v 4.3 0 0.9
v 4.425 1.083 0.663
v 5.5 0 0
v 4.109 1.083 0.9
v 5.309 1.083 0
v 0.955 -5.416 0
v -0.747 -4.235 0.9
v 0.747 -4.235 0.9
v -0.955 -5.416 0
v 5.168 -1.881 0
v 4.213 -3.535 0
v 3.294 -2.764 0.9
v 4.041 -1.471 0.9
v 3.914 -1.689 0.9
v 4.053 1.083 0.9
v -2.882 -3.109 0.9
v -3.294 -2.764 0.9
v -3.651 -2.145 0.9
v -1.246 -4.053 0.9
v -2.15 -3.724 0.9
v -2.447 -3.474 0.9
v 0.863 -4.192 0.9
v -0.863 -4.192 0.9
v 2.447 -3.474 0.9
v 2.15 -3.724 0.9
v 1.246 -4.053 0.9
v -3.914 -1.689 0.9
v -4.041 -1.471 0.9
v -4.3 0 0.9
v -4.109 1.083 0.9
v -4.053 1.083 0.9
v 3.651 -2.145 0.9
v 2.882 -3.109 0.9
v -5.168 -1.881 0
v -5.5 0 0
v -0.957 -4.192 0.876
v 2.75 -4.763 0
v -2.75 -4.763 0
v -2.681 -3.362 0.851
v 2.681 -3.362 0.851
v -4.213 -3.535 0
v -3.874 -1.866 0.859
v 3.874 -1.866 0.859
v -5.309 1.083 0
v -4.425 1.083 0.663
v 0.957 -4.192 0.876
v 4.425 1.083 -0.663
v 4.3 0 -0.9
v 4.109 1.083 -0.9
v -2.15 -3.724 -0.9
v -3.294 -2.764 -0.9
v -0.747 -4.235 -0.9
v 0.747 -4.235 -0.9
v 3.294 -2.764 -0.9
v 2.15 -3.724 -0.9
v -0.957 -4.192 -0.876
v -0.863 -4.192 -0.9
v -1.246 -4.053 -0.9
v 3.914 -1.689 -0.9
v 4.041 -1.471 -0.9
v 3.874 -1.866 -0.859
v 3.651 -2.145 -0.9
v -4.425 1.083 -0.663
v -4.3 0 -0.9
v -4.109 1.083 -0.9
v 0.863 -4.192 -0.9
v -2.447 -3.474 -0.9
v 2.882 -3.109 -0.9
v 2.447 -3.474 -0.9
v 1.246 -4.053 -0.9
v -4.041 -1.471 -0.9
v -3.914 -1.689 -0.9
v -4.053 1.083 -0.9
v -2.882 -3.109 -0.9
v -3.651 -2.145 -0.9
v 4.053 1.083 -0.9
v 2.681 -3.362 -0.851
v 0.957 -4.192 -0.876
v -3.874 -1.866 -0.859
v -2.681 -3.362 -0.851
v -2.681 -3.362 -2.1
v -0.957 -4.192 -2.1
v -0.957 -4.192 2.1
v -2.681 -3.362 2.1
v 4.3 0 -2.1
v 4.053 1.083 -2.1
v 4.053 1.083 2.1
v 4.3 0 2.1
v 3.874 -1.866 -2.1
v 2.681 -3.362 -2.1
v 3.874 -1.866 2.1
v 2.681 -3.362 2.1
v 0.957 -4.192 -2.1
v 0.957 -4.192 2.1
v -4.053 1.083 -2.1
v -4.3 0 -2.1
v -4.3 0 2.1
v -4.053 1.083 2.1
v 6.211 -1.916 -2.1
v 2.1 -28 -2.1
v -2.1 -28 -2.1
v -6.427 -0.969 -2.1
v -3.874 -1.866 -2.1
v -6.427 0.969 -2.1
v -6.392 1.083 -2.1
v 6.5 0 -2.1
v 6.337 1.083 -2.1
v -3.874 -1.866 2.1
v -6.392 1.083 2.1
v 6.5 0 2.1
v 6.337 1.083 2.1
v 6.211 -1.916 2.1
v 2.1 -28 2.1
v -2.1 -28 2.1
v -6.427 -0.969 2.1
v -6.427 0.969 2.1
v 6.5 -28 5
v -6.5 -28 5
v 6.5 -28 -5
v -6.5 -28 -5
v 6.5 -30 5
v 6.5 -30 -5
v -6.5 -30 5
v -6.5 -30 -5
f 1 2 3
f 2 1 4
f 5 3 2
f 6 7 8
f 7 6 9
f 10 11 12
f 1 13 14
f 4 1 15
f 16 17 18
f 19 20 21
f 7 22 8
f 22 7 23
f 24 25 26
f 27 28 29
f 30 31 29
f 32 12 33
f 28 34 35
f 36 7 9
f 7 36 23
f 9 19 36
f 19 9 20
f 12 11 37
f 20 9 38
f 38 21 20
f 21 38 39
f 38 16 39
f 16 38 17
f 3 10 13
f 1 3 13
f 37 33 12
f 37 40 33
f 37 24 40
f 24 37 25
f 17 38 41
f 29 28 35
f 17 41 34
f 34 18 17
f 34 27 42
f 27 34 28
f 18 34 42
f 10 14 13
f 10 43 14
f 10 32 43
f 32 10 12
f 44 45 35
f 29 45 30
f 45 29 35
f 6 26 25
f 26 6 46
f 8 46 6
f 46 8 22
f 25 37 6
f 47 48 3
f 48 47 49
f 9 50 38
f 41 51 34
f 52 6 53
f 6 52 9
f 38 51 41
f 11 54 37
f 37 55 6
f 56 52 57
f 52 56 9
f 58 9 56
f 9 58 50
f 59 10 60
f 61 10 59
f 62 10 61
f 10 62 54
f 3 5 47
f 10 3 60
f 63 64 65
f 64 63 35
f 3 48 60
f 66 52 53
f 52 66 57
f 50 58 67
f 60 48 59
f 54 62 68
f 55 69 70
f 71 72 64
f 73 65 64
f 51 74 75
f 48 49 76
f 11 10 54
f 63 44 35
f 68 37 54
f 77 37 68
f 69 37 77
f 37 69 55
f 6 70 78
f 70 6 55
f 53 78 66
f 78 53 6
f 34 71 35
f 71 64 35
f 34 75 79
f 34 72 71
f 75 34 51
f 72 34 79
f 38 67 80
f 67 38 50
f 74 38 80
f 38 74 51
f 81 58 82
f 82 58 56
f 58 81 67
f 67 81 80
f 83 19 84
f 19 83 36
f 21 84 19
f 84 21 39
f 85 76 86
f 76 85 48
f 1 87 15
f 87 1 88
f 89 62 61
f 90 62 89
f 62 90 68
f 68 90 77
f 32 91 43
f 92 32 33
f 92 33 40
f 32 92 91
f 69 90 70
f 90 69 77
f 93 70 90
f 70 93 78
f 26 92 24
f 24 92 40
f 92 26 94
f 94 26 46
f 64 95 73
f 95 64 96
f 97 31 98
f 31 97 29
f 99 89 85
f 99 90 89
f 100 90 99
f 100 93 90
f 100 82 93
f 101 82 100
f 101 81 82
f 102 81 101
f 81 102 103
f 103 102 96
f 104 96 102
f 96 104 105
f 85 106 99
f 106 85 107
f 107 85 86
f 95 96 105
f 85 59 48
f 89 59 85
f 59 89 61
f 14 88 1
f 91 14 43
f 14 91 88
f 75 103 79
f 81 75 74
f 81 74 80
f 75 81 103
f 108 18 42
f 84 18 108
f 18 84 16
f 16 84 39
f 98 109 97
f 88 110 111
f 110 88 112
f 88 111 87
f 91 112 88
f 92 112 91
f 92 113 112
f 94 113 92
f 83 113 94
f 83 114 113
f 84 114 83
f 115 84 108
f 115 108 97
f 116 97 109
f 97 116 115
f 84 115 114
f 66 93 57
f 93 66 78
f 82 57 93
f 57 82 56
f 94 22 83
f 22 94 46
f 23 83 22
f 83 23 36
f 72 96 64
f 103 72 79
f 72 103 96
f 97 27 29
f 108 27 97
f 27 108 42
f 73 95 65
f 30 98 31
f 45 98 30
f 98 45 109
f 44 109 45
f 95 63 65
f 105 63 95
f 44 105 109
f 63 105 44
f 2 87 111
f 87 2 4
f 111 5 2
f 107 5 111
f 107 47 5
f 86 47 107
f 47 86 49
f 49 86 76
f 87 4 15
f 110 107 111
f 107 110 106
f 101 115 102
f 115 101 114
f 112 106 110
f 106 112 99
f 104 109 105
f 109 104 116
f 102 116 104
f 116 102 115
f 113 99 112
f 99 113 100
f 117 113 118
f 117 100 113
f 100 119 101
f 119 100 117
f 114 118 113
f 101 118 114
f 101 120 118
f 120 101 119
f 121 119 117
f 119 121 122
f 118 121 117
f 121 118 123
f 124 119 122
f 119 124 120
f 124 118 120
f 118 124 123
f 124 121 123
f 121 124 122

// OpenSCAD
$LENSE_DIAMETER         = 11;
$LENSE_RIM_THICKNESS    = 1.8;
$FRAME_RIM_HEIGHT       = 1.2;
$FRAME_RIM_WIDTH        = 1.2;
$FOOT_HEIGHT            = 2;
$FOOT_DEPTH             = 10;
$HEIGHT                 = 30;


$LENSE_RADIUS           = $LENSE_DIAMETER/2;
$FRAME_THICKNESS        = 2 * $FRAME_RIM_WIDTH + $LENSE_RIM_THICKNESS;
$FRAME_RADIUS           = $LENSE_RADIUS + 1;
$FOOT                   = [2 * $FRAME_RADIUS, $FOOT_HEIGHT, $FOOT_DEPTH];
$STAND_LENGTH           = $HEIGHT - $FOOT[1] - $LENSE_RADIUS;


module lense_cutout(){
    cylinder($LENSE_RIM_THICKNESS/2, $LENSE_RADIUS, $LENSE_RADIUS - $FRAME_RIM_HEIGHT);
    translate([0,0,-$LENSE_RIM_THICKNESS/2])
        cylinder($LENSE_RIM_THICKNESS/2, $LENSE_RADIUS - $FRAME_RIM_HEIGHT, $LENSE_RADIUS);
    cylinder($FRAME_THICKNESS, $LENSE_RADIUS - $FRAME_RIM_HEIGHT, $LENSE_RADIUS - $FRAME_RIM_HEIGHT, center = true);
    translate([0,$FRAME_RADIUS / 1.5, 0])
        cube([2 * $FRAME_RADIUS, $FRAME_RADIUS, $FRAME_THICKNESS], center=true);
}

module frame(){
    cylinder($FRAME_THICKNESS, $FRAME_RADIUS, $FRAME_RADIUS, center = true);
}

module pillar(){
    translate([0, - ($STAND_LENGTH/2 + $LENSE_RADIUS), 0])
        cube([$FRAME_THICKNESS, $STAND_LENGTH, $FRAME_THICKNESS], center = true);
}

module foot(){
    //foot
    translate([0,- ($HEIGHT - $FOOT[1]/2),0])
        cube($FOOT, center = true);
}

difference(){
    hull(){
        frame();
        pillar();
    }
    lense_cutout();
}

pillar();
foot();
